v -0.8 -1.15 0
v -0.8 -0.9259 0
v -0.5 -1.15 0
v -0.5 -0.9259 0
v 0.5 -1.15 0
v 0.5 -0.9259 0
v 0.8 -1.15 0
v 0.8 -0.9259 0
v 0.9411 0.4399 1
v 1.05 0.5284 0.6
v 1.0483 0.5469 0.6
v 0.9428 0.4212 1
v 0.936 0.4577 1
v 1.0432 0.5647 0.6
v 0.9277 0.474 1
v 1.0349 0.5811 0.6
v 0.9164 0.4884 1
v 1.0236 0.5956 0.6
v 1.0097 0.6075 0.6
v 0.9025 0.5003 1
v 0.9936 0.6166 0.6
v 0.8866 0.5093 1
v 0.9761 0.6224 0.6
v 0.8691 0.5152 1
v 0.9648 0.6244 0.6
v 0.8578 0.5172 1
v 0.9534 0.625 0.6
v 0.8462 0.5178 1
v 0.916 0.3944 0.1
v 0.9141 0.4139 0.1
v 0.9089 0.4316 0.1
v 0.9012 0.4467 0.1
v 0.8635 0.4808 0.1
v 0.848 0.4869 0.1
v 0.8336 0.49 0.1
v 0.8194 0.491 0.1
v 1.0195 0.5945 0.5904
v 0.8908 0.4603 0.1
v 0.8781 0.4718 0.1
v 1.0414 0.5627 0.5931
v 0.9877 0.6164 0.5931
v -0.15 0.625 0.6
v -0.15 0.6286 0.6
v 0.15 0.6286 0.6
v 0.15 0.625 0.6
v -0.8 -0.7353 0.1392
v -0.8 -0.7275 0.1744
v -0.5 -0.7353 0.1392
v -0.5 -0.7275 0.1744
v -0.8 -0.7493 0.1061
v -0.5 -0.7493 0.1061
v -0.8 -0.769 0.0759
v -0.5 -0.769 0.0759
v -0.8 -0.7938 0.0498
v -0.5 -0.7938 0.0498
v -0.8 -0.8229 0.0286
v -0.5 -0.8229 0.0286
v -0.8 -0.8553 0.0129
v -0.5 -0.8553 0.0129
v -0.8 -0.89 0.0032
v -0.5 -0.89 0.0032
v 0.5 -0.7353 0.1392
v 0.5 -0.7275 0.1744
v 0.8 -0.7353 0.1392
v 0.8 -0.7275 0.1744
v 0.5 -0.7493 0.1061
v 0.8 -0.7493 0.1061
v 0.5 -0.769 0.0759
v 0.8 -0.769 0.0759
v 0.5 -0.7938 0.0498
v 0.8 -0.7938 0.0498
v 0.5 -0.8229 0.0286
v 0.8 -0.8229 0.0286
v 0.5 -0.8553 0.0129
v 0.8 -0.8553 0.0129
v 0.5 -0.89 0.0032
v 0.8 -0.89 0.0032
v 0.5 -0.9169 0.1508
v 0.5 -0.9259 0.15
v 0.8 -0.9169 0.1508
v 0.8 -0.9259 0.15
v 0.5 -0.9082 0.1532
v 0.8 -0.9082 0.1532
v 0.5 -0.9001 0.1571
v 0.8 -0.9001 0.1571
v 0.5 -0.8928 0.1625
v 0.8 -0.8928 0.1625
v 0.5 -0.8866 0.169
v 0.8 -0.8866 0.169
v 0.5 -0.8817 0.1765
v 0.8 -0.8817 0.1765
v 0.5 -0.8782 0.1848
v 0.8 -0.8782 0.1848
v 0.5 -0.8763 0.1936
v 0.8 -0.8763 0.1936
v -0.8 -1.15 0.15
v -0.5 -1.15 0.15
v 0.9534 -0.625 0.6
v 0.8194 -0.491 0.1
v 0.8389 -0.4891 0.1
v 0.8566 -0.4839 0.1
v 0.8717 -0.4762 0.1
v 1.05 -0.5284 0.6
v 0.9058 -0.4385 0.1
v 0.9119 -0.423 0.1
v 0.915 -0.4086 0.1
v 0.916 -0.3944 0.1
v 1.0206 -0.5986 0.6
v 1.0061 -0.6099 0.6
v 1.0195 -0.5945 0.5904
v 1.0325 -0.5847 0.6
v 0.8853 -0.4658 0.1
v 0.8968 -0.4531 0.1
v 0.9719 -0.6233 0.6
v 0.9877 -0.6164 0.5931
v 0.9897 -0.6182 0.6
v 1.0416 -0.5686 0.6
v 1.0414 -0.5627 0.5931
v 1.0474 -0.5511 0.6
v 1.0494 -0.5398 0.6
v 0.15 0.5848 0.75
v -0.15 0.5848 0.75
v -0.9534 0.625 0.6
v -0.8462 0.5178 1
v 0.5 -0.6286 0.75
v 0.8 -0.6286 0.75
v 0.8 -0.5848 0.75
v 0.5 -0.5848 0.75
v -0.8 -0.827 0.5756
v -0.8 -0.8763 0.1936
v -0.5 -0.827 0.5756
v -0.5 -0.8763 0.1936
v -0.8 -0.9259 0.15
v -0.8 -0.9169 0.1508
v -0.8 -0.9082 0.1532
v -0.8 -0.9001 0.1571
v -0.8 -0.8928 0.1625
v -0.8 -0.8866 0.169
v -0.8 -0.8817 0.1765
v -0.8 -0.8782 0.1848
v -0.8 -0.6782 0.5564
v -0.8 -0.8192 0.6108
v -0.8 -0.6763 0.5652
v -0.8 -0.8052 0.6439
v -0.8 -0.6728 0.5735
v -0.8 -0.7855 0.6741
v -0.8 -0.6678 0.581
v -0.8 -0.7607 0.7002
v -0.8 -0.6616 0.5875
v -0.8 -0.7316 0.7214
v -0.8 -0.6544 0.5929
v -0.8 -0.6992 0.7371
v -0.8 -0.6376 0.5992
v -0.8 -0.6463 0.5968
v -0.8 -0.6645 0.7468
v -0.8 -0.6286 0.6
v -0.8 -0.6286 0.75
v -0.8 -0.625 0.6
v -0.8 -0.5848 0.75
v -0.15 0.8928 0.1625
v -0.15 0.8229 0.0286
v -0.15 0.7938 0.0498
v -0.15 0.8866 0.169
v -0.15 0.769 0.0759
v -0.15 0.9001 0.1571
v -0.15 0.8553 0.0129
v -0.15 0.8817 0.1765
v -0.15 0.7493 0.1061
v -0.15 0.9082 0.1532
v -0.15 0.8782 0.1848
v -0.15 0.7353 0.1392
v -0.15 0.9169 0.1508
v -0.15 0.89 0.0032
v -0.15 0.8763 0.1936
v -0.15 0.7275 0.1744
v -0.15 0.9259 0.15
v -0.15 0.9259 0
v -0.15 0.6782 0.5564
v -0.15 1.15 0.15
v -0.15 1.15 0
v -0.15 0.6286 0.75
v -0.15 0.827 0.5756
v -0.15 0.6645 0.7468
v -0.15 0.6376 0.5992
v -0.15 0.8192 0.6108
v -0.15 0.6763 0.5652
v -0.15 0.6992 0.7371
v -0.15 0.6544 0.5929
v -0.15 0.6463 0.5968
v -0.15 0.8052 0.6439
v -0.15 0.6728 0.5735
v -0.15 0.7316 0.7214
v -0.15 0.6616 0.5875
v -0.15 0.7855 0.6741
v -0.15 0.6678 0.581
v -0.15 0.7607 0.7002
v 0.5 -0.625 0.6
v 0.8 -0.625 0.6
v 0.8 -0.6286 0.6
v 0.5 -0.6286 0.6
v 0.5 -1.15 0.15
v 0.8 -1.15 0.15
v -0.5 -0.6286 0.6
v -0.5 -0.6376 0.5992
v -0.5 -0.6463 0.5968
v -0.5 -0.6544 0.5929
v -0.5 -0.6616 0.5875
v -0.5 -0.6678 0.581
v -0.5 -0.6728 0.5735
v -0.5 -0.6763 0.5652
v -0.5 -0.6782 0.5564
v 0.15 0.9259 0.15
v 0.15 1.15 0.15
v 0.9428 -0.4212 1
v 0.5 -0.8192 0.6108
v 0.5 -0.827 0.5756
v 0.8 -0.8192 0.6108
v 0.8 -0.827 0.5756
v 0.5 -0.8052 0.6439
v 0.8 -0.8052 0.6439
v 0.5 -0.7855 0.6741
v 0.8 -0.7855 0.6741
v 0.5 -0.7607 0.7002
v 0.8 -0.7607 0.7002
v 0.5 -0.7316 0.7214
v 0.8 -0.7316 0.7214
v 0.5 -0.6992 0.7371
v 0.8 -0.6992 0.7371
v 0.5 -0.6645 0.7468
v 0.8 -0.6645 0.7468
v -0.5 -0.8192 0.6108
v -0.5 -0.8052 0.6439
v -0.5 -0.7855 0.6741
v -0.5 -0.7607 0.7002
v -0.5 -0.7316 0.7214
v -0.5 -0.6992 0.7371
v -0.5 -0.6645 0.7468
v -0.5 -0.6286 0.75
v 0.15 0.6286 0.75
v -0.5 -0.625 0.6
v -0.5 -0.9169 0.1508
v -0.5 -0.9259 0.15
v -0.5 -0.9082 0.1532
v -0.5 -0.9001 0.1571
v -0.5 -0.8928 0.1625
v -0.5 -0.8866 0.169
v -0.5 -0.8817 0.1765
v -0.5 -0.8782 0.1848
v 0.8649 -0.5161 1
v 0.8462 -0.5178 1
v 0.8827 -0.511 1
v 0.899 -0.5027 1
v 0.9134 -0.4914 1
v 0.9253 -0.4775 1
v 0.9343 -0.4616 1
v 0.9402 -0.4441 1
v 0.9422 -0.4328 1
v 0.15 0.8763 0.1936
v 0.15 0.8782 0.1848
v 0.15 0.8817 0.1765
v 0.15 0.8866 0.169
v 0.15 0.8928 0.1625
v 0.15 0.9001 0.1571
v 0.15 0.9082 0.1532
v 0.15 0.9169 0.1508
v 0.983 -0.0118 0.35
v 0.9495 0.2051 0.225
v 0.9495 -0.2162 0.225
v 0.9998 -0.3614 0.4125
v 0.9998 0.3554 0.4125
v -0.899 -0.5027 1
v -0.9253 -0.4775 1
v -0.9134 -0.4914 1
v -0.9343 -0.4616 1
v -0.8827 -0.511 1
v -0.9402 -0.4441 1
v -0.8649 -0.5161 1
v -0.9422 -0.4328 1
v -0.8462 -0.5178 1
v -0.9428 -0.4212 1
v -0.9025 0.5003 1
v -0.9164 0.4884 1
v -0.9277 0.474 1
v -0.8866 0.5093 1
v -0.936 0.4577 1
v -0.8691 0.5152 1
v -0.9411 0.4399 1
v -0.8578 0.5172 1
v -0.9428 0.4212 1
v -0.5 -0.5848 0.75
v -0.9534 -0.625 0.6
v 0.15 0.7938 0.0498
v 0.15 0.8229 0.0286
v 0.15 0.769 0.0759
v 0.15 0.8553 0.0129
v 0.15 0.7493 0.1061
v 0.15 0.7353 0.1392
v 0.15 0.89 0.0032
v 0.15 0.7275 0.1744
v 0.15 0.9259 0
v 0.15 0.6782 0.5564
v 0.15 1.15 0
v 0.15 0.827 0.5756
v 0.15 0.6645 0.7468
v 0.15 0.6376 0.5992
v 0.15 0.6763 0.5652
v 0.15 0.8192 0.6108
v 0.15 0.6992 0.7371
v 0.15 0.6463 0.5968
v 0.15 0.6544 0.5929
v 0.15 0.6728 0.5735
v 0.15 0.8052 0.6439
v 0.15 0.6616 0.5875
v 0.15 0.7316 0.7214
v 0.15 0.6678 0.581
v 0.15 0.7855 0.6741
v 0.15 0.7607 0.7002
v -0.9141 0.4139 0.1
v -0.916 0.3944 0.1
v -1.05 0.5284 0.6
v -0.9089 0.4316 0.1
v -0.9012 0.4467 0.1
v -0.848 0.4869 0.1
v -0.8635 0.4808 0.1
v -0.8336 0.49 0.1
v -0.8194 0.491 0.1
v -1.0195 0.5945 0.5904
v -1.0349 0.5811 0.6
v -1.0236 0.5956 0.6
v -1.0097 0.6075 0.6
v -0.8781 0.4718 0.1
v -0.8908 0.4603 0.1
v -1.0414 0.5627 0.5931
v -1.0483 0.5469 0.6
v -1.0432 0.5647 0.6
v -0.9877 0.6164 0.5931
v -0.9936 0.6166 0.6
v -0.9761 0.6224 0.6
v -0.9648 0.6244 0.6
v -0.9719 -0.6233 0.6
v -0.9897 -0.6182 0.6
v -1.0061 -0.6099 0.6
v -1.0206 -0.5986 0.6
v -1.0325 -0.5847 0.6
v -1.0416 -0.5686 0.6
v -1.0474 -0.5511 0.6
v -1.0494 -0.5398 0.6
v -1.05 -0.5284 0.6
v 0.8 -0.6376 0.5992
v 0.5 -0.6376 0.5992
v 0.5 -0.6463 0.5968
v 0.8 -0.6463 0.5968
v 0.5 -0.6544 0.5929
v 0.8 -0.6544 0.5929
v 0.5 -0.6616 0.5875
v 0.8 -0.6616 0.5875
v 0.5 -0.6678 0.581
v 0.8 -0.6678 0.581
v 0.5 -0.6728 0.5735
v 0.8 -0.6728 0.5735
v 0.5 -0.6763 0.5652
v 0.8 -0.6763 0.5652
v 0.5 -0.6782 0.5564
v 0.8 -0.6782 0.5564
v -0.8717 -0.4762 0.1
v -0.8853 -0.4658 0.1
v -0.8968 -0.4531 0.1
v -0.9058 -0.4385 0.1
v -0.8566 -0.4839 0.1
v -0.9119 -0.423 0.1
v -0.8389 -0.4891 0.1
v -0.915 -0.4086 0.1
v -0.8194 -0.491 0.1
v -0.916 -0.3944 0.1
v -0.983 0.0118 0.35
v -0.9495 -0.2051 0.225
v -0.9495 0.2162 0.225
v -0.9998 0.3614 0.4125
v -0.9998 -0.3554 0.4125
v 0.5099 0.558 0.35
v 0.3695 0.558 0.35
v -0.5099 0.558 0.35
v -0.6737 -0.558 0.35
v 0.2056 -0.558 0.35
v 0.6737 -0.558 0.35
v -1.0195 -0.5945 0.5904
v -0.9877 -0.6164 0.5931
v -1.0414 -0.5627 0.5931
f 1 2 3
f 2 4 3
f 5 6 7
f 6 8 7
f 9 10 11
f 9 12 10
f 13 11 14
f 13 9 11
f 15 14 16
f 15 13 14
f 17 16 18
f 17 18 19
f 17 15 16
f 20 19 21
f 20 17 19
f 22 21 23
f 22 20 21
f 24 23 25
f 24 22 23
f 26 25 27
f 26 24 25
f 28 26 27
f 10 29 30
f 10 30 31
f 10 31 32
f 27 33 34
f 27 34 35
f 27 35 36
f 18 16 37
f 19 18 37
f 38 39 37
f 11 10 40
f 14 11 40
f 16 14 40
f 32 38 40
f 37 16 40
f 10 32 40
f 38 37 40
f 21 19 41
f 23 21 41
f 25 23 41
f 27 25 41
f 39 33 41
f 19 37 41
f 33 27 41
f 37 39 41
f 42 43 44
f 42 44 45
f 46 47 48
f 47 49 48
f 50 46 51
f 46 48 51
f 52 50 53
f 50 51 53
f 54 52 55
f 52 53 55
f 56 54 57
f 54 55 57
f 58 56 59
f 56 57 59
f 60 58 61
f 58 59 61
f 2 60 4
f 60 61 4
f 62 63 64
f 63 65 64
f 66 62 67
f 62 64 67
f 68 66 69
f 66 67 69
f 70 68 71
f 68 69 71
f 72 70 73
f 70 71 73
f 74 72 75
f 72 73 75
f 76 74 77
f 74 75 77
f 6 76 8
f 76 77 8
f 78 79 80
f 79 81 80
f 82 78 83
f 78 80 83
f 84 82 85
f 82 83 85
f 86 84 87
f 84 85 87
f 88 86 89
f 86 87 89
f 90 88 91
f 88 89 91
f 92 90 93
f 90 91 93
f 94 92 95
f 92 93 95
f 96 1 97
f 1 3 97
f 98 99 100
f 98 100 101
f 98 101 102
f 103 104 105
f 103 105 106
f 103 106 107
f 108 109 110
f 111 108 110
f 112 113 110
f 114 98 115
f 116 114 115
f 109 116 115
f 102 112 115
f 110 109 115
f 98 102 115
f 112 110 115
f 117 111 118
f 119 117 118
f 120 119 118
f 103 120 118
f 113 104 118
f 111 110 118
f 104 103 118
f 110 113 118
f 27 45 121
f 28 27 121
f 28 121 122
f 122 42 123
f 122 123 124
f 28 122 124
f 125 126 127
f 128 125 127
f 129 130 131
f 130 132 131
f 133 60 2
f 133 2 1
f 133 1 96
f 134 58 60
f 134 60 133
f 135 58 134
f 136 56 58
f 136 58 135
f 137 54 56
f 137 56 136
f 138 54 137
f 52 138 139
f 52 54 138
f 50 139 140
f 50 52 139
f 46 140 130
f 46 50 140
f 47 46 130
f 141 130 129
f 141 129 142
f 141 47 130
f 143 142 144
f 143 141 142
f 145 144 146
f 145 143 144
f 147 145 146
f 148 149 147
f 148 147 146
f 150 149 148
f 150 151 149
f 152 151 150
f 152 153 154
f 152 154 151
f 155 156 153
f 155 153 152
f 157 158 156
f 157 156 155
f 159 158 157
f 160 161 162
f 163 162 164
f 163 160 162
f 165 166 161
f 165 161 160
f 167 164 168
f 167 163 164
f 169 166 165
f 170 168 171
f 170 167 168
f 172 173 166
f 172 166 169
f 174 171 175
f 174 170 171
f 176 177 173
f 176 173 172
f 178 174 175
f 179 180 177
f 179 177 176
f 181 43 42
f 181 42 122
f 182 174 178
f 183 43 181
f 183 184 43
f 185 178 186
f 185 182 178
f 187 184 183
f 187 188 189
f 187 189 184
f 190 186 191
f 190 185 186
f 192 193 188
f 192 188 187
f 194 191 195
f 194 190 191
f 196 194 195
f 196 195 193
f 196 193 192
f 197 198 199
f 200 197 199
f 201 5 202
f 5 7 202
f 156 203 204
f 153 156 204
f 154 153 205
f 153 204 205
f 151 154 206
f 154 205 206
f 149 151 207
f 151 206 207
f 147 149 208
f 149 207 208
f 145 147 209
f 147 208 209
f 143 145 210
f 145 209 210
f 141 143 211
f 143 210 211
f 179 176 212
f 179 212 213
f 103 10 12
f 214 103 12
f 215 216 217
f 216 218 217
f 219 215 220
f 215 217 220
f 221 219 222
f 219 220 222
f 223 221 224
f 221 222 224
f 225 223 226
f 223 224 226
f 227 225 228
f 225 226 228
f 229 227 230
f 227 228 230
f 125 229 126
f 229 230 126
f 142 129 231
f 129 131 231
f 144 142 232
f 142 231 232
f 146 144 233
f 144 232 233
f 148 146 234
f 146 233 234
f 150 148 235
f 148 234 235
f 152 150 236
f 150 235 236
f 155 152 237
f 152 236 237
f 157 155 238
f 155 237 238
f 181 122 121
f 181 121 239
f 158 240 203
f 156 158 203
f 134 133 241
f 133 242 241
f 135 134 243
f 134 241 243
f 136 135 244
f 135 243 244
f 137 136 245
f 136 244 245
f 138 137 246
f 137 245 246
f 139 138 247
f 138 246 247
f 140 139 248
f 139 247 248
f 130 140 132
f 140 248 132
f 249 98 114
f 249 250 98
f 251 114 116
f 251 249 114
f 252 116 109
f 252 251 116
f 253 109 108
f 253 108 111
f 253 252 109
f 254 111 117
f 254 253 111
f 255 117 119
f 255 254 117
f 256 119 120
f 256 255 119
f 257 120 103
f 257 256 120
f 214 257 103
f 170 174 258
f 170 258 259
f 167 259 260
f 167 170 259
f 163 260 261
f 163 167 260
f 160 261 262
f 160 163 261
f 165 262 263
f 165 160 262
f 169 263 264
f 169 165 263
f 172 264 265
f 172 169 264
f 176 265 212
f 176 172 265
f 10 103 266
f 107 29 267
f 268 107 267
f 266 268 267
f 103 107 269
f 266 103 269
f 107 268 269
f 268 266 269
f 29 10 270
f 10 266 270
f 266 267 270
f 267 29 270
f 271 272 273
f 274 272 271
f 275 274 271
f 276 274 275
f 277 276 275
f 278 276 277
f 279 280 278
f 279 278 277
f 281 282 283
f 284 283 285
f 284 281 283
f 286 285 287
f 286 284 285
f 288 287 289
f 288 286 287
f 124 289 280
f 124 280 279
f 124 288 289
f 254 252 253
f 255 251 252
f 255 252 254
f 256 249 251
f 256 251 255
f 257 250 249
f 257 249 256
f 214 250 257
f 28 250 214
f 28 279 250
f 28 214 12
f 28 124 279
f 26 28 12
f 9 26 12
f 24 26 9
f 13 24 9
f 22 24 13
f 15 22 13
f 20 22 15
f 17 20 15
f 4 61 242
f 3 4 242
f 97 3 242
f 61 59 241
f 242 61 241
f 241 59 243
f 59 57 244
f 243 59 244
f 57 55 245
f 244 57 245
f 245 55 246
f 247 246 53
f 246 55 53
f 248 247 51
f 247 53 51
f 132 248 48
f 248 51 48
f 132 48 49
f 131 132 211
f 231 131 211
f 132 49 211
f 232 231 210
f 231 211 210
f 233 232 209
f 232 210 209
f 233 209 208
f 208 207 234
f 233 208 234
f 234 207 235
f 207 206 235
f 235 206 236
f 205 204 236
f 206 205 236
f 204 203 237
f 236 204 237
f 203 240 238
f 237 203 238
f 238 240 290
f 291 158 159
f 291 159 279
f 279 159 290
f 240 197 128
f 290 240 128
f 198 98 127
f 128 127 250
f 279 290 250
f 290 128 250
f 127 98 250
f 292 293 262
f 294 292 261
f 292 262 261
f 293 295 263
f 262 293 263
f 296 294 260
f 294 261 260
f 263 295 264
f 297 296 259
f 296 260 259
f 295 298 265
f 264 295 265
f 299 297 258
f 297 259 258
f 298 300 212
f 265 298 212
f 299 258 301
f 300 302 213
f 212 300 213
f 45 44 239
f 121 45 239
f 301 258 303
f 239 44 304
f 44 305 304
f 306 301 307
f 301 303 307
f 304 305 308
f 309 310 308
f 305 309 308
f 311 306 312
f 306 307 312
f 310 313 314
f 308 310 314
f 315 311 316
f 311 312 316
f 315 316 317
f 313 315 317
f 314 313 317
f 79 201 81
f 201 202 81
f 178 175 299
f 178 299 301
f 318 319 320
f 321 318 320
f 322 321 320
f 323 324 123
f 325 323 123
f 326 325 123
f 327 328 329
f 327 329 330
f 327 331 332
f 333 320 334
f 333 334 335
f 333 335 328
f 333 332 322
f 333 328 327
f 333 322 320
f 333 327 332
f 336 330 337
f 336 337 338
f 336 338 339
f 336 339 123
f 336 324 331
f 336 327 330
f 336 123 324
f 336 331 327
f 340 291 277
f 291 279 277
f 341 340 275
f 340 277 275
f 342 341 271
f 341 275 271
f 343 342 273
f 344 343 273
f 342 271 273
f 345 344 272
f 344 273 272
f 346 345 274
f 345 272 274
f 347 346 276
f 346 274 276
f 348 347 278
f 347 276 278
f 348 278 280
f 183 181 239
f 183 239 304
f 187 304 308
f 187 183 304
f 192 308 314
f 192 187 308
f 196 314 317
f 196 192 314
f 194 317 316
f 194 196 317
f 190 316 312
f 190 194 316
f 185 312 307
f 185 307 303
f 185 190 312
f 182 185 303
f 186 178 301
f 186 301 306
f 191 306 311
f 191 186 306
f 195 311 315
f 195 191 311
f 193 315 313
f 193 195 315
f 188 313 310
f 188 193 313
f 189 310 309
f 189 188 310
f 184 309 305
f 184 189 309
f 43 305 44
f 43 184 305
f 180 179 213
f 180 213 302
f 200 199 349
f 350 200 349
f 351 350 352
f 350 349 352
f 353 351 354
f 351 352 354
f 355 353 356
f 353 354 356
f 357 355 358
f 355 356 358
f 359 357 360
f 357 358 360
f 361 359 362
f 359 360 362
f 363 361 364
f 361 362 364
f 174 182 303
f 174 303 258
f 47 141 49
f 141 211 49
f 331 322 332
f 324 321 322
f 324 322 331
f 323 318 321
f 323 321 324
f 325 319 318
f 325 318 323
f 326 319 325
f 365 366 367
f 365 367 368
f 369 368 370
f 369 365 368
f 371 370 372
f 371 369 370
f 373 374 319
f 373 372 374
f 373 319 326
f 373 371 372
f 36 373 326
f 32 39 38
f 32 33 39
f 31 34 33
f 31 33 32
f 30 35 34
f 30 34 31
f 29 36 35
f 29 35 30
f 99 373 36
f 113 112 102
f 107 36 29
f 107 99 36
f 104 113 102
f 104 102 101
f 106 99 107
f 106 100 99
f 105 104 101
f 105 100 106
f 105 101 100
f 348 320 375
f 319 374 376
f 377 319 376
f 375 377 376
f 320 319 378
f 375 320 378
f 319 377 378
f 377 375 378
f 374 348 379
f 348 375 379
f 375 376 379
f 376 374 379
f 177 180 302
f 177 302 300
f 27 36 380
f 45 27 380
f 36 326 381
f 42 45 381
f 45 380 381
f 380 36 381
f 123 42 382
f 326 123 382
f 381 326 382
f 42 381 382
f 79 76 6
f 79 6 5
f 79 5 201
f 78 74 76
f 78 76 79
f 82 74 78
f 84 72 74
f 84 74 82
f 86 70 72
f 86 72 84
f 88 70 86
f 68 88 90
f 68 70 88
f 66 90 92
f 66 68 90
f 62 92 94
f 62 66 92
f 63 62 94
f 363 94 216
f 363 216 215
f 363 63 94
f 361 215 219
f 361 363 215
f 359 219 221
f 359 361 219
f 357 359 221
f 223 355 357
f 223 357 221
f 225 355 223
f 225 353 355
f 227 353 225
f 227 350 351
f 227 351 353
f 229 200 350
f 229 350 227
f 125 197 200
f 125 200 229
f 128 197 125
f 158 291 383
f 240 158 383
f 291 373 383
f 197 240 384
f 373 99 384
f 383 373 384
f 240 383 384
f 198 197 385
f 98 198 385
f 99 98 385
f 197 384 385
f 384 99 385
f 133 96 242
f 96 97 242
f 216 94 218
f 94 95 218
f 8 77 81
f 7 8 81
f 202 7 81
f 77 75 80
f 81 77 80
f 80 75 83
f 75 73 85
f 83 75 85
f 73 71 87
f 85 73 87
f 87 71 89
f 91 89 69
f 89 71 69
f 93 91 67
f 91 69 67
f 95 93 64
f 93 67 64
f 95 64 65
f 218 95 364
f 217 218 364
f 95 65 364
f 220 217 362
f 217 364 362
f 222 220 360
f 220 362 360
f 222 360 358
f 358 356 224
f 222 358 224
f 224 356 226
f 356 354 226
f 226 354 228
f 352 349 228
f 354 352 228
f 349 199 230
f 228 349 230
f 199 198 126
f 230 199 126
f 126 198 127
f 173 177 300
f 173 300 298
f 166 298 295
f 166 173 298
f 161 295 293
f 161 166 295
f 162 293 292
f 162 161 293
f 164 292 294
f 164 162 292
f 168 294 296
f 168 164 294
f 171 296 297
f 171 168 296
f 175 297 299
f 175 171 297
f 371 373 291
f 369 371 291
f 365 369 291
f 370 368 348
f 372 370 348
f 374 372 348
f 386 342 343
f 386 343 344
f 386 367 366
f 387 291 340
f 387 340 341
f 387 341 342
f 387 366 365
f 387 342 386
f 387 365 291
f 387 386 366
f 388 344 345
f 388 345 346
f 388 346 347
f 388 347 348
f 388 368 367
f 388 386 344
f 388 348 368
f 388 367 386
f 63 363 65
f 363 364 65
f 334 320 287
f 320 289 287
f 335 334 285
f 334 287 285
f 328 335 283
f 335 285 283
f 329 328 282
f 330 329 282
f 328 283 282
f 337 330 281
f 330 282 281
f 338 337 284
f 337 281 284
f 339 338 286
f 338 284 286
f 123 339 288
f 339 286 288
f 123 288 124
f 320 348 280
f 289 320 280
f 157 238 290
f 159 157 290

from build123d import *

# Parameters (mm, degrees)
EXTRUDE_START             = 0.6
SKETCH_1_W                = 2.1
SKETCH_1_H                = 1.25
EXTRUDE_1_DEPTH           = 0.4
EXTRUDE_1_TAPER           = 15
EXTRUDE_1_OTHER_WAY_DEPTH = 0.5
EXTRUDE_1_OTHER_WAY_TAPER = 15
EXTRUDE_START_2           = -0.15
EXTRUDE_4_DEPTH           = 0.3
EXTRUDE_START_3           = 0.65
EXTRUDE_5_DEPTH           = 0.15
PATTERN_LINEAR_2_COUNT    = 2
PATTERN_LINEAR_2_PITCH    = 1.3
FILLET_3_R                = 0.1


with BuildPart() as part:
    # Эскиз1 → Вытянуть1 (new body)
    with BuildSketch(Plane.XY.offset(EXTRUDE_START)):
        Rectangle(SKETCH_1_W, SKETCH_1_H)
    extrude(amount=EXTRUDE_1_DEPTH, taper=EXTRUDE_1_TAPER)

    # Эскиз1 → Вытянуть1 other way (add)
    with BuildSketch(Plane.XY.offset(EXTRUDE_START)):
        Rectangle(SKETCH_1_W, SKETCH_1_H)
    extrude(amount=-EXTRUDE_1_OTHER_WAY_DEPTH, taper=EXTRUDE_1_OTHER_WAY_TAPER)

    # Эскиз2 → Вытянуть4 (add)
    with BuildSketch(Plane(origin=(0, 0, 0), x_dir=(0, 0, -1), z_dir=(1, 0, 0)).offset(EXTRUDE_START_2)):
        with BuildLine():
            Line((-0.6, 0.55), (-0.75, 0.55))
            Line((-0.75, 0.55), (-0.75, 0.628617172))
            ThreePointArc((-0.75, 0.628617172), (-0.700198025, 0.760679859), (-0.575594468, 0.82697272))
            Line((-0.575594468, 0.82697272), (-0.193601383, 0.876262542))
            ThreePointArc((-0.193601383, 0.876262542), (-0.162450494, 0.892835757), (-0.15, 0.925851429))
            Line((-0.15, 0.925851429), (-0.15, 1.15))
            Line((-0.15, 1.15), (0, 1.15))
            Line((0, 1.15), (0, 0.925851429))
            ThreePointArc((0, 0.925851429), (-0.049801975, 0.793788742), (-0.174405532, 0.727495881))
            Line((-0.174405532, 0.727495881), (-0.556398617, 0.678206059))
            ThreePointArc((-0.556398617, 0.678206059), (-0.587549506, 0.661632844), (-0.6, 0.628617172))
            Line((-0.6, 0.628617172), (-0.6, 0.55))
        make_face()
    extrude(amount=EXTRUDE_4_DEPTH)

    # Эскиз2<4> → Вытянуть5 (add, symmetric)
    with BuildSketch(Plane(origin=(0, 0, 0), x_dir=(0, 0, -1), z_dir=(1, 0, 0)).offset(EXTRUDE_START_3)):
        with BuildLine():
            ThreePointArc((-0.6, -0.628617172), (-0.587549506, -0.661632844), (-0.556398617, -0.678206059))
            Line((-0.556398617, -0.678206059), (-0.174405532, -0.727495881))
            ThreePointArc((-0.174405532, -0.727495881), (-0.049801975, -0.793788742), (0, -0.925851429))
            Line((0, -0.925851429), (0, -1.15))
            Line((0, -1.15), (-0.15, -1.15))
            Line((-0.15, -1.15), (-0.15, -0.925851429))
            ThreePointArc((-0.15, -0.925851429), (-0.162450494, -0.892835757), (-0.193601383, -0.876262542))
            Line((-0.193601383, -0.876262542), (-0.575594468, -0.82697272))
            ThreePointArc((-0.575594468, -0.82697272), (-0.700198025, -0.760679859), (-0.75, -0.628617172))
            Line((-0.75, -0.628617172), (-0.75, -0.55))
            Line((-0.75, -0.55), (-0.6, -0.55))
            Line((-0.6, -0.55), (-0.6, -0.628617172))
        make_face()
    extrude_5 = extrude(amount=EXTRUDE_5_DEPTH, both=True)

    # Линейный массив2: Вытянуть5 ×2
    with Locations(*[(-i * PATTERN_LINEAR_2_PITCH, 0, 0) for i in range(1, PATTERN_LINEAR_2_COUNT)]):
        add(extrude_5)

    # Скругление3
    fillet_3_edges = [part.edges().sort_by_distance(p)[0] for p in [
        (0.996410162, -0.571410162, 0.8),
        (0.996410162, 0.571410162, 0.8),
        (-0.996410162, 0.571410162, 0.8),
        (-0.996410162, -0.571410162, 0.8),
        (0.983012702, -0.558012702, 0.35),
        (-0.983012702, -0.558012702, 0.35),
        (-0.983012702, 0.558012702, 0.35),
        (0.983012702, 0.558012702, 0.35),
    ]]
    fillet(fillet_3_edges, radius=FILLET_3_R)


solid = part.part
